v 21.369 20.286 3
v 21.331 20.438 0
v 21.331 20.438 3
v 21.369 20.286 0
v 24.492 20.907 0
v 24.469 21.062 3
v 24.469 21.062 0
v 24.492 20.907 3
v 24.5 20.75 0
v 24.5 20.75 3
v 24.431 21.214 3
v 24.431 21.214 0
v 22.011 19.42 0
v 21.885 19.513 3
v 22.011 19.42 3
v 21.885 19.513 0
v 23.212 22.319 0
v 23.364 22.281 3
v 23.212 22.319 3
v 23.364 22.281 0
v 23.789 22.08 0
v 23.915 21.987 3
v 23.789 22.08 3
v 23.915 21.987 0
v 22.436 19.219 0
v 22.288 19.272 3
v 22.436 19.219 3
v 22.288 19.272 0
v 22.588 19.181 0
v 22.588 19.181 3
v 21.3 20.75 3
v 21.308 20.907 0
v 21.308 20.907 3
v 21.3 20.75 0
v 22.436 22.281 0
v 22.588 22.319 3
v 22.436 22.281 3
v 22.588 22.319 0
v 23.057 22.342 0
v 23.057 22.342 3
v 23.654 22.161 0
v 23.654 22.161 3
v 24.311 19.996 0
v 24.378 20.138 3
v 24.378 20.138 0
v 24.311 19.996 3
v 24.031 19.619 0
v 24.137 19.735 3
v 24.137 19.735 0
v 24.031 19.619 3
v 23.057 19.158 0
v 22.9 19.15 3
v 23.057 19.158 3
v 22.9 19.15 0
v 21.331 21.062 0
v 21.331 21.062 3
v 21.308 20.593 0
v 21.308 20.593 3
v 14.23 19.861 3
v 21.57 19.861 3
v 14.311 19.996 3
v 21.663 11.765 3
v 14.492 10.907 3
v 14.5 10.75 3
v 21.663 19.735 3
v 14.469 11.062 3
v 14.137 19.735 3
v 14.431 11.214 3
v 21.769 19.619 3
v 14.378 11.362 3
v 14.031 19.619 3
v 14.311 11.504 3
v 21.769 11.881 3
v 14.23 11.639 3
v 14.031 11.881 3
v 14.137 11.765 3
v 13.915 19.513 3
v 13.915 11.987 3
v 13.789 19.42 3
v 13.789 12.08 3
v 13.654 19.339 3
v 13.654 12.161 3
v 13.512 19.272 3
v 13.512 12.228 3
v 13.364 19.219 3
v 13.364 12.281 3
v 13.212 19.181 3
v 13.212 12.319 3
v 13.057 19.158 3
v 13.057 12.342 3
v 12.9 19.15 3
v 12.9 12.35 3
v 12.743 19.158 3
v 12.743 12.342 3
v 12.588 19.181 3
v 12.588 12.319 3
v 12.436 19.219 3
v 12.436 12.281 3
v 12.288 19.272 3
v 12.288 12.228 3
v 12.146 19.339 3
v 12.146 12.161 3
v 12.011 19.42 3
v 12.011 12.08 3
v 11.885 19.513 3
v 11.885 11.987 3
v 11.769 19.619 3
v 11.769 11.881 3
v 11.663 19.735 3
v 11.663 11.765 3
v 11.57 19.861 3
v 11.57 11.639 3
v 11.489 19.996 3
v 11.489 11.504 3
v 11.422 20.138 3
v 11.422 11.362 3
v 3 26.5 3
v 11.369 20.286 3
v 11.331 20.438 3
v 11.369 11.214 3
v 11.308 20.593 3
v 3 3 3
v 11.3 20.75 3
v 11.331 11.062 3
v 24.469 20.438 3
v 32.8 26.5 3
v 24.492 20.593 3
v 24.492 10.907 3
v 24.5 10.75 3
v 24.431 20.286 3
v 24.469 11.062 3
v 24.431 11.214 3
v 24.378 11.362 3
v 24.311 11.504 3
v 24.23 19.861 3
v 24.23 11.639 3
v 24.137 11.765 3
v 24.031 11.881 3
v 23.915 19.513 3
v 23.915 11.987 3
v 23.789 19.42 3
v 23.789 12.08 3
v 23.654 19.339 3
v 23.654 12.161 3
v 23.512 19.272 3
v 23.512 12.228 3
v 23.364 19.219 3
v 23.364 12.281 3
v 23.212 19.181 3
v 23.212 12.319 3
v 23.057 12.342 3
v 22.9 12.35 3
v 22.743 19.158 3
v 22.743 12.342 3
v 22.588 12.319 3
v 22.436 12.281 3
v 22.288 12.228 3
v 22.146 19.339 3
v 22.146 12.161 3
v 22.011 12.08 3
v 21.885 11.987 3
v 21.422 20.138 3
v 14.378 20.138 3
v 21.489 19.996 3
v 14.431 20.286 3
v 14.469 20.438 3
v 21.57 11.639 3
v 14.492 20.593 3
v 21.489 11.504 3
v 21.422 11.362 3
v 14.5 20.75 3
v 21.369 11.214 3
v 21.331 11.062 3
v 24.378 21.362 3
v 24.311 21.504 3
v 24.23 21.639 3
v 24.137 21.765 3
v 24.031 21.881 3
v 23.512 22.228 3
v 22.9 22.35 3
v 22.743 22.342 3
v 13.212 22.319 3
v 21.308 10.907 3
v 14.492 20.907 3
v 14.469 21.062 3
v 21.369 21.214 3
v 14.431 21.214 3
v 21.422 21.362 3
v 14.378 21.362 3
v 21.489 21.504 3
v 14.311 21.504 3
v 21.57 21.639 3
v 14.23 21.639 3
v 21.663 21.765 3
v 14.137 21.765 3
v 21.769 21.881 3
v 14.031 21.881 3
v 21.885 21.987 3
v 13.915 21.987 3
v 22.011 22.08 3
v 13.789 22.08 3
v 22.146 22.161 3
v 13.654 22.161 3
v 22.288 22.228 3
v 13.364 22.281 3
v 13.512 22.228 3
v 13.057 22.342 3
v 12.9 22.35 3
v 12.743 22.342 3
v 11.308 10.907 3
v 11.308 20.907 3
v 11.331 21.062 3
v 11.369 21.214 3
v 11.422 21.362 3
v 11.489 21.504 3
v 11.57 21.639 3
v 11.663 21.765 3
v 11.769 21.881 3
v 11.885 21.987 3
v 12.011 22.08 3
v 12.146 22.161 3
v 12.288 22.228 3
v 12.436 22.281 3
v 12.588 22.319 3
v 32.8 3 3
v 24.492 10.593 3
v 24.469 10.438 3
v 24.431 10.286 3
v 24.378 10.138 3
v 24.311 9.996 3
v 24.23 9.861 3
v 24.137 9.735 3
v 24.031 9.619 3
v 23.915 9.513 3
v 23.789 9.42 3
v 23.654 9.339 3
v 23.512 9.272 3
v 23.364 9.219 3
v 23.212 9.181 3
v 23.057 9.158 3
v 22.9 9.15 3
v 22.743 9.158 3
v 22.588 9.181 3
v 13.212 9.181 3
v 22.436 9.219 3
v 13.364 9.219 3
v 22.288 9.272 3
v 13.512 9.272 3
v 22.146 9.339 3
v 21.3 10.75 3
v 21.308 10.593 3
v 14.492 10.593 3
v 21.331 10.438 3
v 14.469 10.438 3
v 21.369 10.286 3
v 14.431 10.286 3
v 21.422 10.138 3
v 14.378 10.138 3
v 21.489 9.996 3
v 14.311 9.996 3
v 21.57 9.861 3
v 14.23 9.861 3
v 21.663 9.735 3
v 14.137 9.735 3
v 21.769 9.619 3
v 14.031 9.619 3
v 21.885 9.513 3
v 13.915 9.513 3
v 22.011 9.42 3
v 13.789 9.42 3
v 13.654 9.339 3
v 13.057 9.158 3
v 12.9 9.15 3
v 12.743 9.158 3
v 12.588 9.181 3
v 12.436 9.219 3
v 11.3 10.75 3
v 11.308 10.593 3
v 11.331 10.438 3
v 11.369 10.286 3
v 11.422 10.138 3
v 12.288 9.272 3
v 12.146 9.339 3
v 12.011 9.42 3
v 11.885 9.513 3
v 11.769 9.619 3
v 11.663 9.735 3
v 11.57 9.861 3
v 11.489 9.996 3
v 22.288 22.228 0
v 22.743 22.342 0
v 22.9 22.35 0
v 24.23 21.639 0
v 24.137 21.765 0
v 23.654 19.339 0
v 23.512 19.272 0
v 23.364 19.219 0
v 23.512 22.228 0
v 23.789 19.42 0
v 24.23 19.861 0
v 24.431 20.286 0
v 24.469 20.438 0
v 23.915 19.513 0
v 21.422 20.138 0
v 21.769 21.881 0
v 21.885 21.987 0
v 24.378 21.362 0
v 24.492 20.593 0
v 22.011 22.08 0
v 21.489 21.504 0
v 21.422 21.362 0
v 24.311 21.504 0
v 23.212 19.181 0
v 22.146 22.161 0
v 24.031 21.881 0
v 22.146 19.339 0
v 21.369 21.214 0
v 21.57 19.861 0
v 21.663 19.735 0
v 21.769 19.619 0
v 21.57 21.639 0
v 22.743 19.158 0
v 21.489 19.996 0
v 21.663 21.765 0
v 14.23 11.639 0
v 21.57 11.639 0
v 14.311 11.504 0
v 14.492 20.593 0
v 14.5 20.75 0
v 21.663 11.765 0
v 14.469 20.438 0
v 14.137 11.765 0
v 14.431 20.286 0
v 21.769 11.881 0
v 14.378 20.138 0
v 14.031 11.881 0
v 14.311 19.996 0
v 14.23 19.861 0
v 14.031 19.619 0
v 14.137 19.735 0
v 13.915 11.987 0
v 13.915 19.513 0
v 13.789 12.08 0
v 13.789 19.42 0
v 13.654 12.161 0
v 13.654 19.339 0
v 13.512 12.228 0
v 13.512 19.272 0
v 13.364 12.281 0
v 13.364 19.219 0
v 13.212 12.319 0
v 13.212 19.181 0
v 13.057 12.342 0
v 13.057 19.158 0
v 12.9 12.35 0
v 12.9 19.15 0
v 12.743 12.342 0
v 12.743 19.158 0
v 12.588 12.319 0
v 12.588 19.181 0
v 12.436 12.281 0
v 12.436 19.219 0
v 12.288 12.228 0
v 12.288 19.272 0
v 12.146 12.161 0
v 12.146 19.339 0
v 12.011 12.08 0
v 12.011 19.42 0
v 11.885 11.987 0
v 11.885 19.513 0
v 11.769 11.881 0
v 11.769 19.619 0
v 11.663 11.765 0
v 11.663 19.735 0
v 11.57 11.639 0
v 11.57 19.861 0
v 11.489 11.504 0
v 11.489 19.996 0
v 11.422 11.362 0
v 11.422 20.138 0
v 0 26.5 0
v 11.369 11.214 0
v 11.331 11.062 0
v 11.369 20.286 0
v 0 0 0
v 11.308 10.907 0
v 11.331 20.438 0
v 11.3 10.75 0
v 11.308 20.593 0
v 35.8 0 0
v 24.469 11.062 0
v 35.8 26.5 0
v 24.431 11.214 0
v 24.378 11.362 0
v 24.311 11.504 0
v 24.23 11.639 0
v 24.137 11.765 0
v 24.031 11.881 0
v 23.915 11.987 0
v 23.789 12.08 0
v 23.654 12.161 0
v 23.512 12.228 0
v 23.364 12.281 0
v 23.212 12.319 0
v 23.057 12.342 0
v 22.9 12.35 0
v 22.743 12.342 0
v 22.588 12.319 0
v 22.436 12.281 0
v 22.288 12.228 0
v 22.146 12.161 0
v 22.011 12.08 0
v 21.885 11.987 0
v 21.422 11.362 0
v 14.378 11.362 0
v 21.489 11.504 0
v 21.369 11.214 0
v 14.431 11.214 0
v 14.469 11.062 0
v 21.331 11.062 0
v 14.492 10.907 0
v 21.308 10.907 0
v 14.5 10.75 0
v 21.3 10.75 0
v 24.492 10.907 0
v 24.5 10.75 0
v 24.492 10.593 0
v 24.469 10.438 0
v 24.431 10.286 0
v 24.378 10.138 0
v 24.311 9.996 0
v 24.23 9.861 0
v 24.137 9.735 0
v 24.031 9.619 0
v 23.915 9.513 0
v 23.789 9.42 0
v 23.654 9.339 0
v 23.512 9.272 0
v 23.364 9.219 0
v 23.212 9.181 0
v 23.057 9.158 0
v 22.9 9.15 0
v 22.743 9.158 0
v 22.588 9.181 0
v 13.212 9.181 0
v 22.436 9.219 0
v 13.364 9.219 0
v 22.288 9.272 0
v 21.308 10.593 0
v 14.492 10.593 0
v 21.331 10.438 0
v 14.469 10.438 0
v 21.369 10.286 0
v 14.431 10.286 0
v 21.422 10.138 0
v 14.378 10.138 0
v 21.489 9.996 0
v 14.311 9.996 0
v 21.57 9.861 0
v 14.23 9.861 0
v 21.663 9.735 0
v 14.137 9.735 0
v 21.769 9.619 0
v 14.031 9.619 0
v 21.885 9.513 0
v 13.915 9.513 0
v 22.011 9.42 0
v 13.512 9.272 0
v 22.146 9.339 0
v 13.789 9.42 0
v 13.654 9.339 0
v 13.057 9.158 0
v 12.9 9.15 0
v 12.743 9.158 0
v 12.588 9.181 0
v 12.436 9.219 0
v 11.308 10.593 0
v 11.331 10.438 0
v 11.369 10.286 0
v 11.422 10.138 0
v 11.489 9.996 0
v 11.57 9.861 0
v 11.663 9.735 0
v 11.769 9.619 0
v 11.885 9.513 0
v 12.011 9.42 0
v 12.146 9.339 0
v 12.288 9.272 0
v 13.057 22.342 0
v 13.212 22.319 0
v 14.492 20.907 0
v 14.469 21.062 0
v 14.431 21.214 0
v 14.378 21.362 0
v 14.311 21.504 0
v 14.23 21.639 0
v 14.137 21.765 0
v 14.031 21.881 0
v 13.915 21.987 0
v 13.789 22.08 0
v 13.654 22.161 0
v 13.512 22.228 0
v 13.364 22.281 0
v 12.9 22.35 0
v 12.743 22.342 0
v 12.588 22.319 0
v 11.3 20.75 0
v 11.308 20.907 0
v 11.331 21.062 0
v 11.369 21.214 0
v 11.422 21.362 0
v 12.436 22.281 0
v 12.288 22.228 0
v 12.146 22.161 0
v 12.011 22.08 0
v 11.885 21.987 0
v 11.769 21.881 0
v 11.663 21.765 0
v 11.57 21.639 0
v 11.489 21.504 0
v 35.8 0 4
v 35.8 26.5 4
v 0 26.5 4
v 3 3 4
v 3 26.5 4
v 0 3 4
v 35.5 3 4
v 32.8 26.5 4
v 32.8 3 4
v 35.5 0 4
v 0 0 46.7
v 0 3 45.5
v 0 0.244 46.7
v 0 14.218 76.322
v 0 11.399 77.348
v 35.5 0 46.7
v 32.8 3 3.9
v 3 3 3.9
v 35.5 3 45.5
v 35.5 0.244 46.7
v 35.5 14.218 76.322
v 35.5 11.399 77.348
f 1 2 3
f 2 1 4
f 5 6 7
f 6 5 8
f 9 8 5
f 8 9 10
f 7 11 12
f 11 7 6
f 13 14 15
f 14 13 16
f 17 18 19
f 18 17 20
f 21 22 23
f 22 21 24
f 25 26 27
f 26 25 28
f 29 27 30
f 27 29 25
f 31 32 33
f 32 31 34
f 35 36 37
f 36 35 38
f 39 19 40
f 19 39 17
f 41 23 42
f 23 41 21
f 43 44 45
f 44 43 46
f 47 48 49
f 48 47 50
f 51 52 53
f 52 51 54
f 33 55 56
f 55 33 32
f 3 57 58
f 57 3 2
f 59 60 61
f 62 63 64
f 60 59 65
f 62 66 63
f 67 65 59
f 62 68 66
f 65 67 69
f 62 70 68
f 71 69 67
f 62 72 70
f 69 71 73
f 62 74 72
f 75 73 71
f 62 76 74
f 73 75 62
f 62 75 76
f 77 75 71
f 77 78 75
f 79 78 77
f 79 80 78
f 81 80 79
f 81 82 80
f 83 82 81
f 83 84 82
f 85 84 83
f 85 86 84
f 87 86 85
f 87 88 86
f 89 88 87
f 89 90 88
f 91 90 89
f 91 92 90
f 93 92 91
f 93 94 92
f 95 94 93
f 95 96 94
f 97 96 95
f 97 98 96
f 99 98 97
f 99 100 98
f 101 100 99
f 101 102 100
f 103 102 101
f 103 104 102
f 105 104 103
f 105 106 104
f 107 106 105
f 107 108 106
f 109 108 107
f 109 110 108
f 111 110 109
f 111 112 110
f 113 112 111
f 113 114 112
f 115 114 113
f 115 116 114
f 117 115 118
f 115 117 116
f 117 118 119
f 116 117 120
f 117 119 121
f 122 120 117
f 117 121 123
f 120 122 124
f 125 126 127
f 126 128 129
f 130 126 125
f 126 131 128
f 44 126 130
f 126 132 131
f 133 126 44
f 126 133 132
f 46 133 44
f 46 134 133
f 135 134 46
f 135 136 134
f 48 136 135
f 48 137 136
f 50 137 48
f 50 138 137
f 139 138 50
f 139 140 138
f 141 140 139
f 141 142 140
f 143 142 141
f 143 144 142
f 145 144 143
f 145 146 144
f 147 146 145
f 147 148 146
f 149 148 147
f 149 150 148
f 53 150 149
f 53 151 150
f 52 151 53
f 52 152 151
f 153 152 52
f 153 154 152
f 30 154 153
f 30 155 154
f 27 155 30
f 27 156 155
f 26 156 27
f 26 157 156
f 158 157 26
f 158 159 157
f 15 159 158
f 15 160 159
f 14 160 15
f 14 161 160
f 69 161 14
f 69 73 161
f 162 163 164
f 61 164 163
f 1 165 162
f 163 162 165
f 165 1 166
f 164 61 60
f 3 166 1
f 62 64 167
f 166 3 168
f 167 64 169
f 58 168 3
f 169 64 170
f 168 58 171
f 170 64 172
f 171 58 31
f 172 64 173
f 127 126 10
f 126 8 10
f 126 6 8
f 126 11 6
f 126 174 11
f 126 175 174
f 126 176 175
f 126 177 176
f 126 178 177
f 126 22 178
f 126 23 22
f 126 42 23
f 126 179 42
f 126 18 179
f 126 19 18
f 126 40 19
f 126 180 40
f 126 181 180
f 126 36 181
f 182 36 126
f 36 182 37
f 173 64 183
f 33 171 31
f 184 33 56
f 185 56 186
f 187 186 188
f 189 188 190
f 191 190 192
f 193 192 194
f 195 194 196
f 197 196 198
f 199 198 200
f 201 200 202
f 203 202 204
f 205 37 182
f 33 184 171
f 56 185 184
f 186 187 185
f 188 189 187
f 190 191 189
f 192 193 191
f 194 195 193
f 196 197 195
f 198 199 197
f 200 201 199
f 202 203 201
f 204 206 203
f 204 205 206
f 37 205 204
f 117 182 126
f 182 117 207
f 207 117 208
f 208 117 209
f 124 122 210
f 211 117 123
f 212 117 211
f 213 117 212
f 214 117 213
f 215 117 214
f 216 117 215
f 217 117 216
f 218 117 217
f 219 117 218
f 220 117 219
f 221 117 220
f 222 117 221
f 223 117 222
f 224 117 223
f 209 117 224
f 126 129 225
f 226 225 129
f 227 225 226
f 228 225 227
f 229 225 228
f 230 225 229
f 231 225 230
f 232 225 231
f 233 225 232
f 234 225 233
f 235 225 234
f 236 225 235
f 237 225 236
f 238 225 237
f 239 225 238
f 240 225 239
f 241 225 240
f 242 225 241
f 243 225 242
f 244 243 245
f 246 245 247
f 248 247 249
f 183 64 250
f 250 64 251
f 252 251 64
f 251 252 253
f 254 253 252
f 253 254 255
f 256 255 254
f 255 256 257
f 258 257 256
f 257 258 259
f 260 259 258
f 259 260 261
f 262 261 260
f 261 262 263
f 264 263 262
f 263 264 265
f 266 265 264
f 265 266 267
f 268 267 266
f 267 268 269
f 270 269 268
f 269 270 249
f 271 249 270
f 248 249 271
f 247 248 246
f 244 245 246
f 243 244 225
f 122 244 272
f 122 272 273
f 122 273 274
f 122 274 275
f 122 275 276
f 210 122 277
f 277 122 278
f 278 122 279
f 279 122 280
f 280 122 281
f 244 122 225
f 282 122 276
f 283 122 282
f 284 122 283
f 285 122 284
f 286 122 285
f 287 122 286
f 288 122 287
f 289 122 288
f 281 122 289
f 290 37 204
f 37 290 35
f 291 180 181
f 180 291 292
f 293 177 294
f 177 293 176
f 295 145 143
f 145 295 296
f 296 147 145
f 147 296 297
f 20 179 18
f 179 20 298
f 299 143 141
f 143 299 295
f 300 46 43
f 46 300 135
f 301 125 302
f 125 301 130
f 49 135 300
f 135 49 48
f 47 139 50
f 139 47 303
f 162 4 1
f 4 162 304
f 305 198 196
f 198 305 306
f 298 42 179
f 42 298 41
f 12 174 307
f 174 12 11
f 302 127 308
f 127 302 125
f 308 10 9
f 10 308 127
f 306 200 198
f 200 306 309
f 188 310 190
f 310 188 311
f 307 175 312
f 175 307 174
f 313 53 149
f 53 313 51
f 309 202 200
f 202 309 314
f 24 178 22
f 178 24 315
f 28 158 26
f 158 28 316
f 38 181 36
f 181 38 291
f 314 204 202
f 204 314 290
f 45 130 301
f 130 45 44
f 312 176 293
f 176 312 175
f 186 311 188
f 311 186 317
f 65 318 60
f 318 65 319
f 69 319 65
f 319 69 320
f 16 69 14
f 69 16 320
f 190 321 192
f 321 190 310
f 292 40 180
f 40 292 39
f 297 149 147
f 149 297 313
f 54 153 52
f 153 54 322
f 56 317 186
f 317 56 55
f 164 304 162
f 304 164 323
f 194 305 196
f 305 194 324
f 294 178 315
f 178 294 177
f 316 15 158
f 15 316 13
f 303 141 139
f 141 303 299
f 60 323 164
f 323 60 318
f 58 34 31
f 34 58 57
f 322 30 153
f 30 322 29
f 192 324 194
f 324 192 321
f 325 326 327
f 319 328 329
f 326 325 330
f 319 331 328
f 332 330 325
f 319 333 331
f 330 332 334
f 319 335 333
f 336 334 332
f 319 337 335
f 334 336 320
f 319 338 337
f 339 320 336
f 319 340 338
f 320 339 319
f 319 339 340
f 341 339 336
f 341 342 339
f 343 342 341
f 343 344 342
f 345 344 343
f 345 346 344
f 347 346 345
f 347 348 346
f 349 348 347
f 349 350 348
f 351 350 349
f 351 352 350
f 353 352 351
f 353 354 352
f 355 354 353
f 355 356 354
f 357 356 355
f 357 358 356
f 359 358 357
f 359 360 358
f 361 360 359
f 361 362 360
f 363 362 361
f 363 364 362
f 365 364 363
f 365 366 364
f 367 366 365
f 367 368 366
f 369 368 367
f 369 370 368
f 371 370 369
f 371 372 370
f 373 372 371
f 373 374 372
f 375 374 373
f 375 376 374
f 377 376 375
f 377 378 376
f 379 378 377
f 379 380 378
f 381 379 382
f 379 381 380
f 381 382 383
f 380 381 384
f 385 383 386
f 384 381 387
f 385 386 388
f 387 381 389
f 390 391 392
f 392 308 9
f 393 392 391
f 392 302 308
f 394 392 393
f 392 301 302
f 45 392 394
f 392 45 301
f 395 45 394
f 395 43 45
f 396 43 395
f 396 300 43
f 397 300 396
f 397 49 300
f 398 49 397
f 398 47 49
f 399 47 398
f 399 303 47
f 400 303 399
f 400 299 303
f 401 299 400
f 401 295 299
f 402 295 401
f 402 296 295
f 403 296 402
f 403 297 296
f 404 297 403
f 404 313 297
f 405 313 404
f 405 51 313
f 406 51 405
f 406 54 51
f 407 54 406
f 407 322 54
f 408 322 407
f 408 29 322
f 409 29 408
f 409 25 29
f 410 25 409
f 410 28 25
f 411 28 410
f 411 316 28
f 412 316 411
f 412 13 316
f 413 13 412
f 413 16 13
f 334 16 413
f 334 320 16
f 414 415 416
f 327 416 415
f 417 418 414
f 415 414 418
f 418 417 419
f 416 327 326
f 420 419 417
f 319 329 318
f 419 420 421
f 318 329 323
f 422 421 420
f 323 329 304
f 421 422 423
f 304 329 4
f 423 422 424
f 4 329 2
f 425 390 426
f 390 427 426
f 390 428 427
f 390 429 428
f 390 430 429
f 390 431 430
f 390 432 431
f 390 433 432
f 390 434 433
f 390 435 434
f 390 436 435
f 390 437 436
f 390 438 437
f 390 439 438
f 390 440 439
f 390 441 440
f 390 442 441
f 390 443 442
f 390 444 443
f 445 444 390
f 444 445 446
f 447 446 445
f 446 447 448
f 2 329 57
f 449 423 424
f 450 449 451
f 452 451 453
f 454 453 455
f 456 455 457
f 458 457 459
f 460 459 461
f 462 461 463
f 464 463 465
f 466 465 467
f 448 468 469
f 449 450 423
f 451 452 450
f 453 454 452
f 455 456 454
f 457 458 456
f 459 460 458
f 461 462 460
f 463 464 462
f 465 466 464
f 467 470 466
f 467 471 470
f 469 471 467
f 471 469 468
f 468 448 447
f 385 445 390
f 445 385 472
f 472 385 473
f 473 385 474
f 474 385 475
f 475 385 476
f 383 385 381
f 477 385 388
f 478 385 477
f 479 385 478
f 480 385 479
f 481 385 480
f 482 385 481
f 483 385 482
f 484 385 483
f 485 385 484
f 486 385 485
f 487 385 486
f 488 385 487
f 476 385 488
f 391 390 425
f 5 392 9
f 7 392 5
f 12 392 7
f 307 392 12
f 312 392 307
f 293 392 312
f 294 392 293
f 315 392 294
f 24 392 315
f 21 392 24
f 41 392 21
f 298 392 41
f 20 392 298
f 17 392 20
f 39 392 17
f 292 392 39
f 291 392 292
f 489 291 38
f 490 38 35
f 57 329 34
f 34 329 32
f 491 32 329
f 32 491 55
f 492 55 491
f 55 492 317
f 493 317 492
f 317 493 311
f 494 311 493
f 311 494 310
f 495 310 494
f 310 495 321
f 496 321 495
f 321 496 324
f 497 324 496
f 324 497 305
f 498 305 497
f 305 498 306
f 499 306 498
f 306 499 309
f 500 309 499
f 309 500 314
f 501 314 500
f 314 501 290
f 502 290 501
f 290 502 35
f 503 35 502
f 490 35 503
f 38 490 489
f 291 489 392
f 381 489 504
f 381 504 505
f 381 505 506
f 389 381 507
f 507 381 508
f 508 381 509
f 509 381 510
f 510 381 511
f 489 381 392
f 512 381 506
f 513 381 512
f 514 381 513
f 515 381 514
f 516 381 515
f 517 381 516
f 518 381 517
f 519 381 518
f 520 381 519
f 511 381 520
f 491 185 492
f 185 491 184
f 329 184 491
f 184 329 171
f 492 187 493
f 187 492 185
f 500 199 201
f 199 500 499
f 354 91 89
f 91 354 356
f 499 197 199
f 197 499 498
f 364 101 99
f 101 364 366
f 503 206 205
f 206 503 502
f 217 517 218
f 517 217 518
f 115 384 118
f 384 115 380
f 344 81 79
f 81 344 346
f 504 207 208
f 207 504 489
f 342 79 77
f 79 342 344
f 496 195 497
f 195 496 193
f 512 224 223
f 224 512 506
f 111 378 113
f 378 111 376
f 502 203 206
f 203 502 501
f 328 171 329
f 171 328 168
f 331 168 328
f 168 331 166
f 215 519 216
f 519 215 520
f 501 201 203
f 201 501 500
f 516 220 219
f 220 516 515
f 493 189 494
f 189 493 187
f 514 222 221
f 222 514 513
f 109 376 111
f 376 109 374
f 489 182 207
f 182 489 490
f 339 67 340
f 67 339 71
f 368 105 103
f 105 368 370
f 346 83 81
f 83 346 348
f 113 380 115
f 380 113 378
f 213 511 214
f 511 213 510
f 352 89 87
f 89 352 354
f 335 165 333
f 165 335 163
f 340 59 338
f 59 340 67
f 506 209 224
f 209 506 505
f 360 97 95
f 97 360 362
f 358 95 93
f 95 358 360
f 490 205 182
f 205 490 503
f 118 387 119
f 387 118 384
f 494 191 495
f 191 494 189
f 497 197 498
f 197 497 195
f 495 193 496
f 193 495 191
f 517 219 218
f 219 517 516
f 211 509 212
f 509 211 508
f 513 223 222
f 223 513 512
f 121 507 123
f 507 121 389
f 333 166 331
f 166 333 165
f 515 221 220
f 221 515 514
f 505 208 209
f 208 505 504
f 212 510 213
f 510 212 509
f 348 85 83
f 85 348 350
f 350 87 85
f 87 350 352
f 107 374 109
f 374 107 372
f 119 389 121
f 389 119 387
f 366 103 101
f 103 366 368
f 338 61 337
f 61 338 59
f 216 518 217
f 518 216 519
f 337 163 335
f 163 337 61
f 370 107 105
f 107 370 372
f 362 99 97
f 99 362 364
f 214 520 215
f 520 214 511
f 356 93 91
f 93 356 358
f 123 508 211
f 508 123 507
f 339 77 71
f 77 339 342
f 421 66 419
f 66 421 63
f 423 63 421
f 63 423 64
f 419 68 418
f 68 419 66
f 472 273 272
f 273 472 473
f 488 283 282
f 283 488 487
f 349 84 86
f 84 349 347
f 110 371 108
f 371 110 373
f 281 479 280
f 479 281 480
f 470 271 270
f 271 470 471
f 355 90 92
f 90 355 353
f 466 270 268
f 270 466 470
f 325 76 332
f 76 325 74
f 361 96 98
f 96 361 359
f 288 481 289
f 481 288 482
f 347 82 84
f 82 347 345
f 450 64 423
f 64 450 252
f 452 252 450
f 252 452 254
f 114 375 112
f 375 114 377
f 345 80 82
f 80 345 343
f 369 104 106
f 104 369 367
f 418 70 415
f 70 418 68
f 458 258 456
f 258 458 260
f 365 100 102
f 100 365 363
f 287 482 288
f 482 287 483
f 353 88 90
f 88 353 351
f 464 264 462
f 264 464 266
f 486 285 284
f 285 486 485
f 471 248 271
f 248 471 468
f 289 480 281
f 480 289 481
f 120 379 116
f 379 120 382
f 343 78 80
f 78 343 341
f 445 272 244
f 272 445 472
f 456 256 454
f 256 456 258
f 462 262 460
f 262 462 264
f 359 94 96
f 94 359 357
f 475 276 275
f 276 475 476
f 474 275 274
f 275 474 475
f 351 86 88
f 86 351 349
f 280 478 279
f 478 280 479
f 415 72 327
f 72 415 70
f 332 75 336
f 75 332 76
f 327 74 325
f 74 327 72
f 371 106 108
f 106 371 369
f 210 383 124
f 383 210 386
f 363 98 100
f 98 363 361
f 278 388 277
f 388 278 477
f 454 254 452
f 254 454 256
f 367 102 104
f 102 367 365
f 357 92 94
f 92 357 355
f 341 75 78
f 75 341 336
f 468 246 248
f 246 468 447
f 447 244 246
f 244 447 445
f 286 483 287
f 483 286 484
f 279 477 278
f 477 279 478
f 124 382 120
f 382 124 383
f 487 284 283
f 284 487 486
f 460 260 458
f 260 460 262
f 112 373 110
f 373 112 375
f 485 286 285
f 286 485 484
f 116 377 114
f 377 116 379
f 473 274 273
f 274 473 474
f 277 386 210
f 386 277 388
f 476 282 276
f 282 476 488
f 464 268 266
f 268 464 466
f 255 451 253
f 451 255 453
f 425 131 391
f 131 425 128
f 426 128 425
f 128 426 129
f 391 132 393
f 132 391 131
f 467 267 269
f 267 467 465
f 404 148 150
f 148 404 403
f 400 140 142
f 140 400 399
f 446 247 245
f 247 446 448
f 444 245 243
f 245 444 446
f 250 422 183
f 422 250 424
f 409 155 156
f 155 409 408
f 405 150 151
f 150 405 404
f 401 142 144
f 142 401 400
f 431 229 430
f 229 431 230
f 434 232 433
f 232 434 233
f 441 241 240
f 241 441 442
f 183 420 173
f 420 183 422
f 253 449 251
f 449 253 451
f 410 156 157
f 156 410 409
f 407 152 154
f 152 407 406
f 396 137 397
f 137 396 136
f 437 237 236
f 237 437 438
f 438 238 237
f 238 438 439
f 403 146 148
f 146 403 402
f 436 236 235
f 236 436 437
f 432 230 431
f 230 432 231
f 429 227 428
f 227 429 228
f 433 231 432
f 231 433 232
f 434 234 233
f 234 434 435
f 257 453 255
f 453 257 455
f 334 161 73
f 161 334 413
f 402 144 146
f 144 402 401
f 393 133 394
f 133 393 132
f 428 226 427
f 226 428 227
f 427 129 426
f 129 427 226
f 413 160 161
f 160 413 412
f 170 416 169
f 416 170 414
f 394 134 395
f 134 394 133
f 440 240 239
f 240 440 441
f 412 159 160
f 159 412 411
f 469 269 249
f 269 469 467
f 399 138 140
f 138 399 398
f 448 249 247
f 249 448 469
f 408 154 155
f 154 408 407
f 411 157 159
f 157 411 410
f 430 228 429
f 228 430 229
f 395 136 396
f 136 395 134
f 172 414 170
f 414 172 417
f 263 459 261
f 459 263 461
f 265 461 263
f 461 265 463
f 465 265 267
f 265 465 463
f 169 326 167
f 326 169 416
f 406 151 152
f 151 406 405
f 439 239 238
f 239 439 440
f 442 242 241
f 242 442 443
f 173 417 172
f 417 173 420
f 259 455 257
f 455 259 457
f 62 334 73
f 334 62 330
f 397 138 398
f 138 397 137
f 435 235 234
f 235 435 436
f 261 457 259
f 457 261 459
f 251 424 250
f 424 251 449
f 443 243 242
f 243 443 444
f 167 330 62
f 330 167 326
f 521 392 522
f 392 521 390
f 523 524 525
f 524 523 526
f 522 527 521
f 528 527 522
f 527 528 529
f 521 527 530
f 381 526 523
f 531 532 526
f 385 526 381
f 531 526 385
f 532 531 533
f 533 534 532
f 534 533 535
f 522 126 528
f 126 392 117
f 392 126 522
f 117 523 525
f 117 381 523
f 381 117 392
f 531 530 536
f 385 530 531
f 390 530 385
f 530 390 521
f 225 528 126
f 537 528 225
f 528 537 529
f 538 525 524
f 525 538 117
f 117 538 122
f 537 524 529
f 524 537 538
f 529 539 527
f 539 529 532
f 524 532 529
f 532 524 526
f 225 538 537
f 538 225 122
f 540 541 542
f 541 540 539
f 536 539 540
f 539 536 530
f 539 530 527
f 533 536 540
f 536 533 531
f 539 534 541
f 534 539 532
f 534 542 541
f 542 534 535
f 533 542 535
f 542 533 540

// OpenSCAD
// file: mg995.scad
srv995_alto_caja = 31;
srv995_alto_base_ini_ala = 27;
srv995_alto_base_fin_ala = 29.8;
srv995_alto_total_eje_circular = 46.2;
srv995_dist_tornillos_largo = 37;
srv995_dist_tornillos_ancho = 16.1;
srv995_dist_tornillo_ala = 9;
srv995_largo_base = 41.1;
srv995_largo_con_alas = 55;
srv995_largo_con_una_ala = 48.2;
srv995_ancho_base = 20.5;
srv995_ancho_alas = 7.15; 
srv995_largo_alas = 20.5; 
srv995_profundo_muesca_ala = 1.5;
srv995_ancho_muesca_ala = 1.8;
srv995_ancho_saliente_cilindro_eje = 7;
// file: tornillos_union.scad
dist_tornillos = 5; //Distancia entre los tornillos de enlace de piezas
torn_ancho = 1.6;
alto_capa = 3;


module tornillos_union4(centrox, centroy) {
		translate([centrox/2+dist_tornillos,centroy/2+dist_tornillos,0])
			cylinder(r=torn_ancho,h=alto_capa,$fn=64);
		translate([centrox/2-dist_tornillos,centroy/2+dist_tornillos,0])
			cylinder(r=torn_ancho,h=alto_capa,$fn=64);
		translate([centrox/2-dist_tornillos,centroy/2-dist_tornillos,0])
			cylinder(r=torn_ancho,h=alto_capa,$fn=64);
		translate([centrox/2+dist_tornillos,centroy/2-dist_tornillos,0])
			cylinder(r=torn_ancho,h=alto_capa,$fn=64);
}

module tornillo(x, y) {
		translate([x, y, 0])
			cylinder(r=torn_ancho,h=alto_capa,$fn=64);
}

module tornillos_asiento4(centrox, centroy) {
		translate([centrox/2+dist_tornillos,centroy/2+dist_tornillos,0])
			cylinder(r2=torn_ancho, r1=asiento_ancho,h=alto_asiento,$fn=64);
		translate([centrox/2-dist_tornillos,centroy/2+dist_tornillos,0])
			cylinder(r2=torn_ancho, r1=asiento_ancho,h=alto_asiento,$fn=64);
		translate([centrox/2-dist_tornillos,centroy/2-dist_tornillos,0])
			cylinder(r2=torn_ancho, r1=asiento_ancho,h=alto_asiento,$fn=64);
		translate([centrox/2+dist_tornillos,centroy/2-dist_tornillos,0])
			cylinder(r2=torn_ancho, r1=asiento_ancho,h=alto_asiento,$fn=64);
}

module tornillos_union2(centrox, centroy, orientacion) {
	if (orientacion == "h")
	{
		translate([centrox/2+dist_tornillos,centroy/2,0])
			cylinder(r=torn_ancho,h=alto_capa,$fn=64);
		translate([centrox/2-dist_tornillos,centroy/2,0])
			cylinder(r=torn_ancho,h=alto_capa,$fn=64);
	}
	else
	{
		translate([centrox/2,centroy/2-dist_tornillos,0])
			cylinder(r=torn_ancho,h=alto_capa,$fn=64);
		translate([centrox/2,centroy/2+dist_tornillos,0])
			cylinder(r=torn_ancho,h=alto_capa,$fn=64);
	}
}
// main file
include <tornillos_union.scad>
include <mg995.scad>

alto_capa = 3;
alto_base = 1;
largo_mano = srv995_ancho_base+4*alto_capa+10;

mano();

module mano()
{
	//Lateral del servo
	difference() {
		cube([srv995_alto_base_fin_ala+2*alto_capa , srv995_ancho_base+2*alto_capa , alto_capa+alto_base]);
		translate([alto_capa,alto_capa,alto_capa])
			cube([srv995_alto_base_fin_ala , srv995_ancho_base+alto_capa , alto_base]);
		tornillos_union4(srv995_alto_base_fin_ala+2*alto_capa, srv995_ancho_base+2*alto_capa+5);
	}

	//Lado mano
	translate([0,alto_capa,alto_base+alto_capa-0.1])
	rotate([90,0,0])
		cube([srv995_ancho_base+5*alto_capa, srv995_alto_base_fin_ala+alto_capa+10 , alto_capa]);

	//Dedos
	translate([0,alto_capa,alto_base+alto_capa+largo_mano-1])
	rotate([70,0,0])
		cube([srv995_ancho_base+5*alto_capa, srv995_alto_base_fin_ala+alto_capa , alto_capa]);

}
